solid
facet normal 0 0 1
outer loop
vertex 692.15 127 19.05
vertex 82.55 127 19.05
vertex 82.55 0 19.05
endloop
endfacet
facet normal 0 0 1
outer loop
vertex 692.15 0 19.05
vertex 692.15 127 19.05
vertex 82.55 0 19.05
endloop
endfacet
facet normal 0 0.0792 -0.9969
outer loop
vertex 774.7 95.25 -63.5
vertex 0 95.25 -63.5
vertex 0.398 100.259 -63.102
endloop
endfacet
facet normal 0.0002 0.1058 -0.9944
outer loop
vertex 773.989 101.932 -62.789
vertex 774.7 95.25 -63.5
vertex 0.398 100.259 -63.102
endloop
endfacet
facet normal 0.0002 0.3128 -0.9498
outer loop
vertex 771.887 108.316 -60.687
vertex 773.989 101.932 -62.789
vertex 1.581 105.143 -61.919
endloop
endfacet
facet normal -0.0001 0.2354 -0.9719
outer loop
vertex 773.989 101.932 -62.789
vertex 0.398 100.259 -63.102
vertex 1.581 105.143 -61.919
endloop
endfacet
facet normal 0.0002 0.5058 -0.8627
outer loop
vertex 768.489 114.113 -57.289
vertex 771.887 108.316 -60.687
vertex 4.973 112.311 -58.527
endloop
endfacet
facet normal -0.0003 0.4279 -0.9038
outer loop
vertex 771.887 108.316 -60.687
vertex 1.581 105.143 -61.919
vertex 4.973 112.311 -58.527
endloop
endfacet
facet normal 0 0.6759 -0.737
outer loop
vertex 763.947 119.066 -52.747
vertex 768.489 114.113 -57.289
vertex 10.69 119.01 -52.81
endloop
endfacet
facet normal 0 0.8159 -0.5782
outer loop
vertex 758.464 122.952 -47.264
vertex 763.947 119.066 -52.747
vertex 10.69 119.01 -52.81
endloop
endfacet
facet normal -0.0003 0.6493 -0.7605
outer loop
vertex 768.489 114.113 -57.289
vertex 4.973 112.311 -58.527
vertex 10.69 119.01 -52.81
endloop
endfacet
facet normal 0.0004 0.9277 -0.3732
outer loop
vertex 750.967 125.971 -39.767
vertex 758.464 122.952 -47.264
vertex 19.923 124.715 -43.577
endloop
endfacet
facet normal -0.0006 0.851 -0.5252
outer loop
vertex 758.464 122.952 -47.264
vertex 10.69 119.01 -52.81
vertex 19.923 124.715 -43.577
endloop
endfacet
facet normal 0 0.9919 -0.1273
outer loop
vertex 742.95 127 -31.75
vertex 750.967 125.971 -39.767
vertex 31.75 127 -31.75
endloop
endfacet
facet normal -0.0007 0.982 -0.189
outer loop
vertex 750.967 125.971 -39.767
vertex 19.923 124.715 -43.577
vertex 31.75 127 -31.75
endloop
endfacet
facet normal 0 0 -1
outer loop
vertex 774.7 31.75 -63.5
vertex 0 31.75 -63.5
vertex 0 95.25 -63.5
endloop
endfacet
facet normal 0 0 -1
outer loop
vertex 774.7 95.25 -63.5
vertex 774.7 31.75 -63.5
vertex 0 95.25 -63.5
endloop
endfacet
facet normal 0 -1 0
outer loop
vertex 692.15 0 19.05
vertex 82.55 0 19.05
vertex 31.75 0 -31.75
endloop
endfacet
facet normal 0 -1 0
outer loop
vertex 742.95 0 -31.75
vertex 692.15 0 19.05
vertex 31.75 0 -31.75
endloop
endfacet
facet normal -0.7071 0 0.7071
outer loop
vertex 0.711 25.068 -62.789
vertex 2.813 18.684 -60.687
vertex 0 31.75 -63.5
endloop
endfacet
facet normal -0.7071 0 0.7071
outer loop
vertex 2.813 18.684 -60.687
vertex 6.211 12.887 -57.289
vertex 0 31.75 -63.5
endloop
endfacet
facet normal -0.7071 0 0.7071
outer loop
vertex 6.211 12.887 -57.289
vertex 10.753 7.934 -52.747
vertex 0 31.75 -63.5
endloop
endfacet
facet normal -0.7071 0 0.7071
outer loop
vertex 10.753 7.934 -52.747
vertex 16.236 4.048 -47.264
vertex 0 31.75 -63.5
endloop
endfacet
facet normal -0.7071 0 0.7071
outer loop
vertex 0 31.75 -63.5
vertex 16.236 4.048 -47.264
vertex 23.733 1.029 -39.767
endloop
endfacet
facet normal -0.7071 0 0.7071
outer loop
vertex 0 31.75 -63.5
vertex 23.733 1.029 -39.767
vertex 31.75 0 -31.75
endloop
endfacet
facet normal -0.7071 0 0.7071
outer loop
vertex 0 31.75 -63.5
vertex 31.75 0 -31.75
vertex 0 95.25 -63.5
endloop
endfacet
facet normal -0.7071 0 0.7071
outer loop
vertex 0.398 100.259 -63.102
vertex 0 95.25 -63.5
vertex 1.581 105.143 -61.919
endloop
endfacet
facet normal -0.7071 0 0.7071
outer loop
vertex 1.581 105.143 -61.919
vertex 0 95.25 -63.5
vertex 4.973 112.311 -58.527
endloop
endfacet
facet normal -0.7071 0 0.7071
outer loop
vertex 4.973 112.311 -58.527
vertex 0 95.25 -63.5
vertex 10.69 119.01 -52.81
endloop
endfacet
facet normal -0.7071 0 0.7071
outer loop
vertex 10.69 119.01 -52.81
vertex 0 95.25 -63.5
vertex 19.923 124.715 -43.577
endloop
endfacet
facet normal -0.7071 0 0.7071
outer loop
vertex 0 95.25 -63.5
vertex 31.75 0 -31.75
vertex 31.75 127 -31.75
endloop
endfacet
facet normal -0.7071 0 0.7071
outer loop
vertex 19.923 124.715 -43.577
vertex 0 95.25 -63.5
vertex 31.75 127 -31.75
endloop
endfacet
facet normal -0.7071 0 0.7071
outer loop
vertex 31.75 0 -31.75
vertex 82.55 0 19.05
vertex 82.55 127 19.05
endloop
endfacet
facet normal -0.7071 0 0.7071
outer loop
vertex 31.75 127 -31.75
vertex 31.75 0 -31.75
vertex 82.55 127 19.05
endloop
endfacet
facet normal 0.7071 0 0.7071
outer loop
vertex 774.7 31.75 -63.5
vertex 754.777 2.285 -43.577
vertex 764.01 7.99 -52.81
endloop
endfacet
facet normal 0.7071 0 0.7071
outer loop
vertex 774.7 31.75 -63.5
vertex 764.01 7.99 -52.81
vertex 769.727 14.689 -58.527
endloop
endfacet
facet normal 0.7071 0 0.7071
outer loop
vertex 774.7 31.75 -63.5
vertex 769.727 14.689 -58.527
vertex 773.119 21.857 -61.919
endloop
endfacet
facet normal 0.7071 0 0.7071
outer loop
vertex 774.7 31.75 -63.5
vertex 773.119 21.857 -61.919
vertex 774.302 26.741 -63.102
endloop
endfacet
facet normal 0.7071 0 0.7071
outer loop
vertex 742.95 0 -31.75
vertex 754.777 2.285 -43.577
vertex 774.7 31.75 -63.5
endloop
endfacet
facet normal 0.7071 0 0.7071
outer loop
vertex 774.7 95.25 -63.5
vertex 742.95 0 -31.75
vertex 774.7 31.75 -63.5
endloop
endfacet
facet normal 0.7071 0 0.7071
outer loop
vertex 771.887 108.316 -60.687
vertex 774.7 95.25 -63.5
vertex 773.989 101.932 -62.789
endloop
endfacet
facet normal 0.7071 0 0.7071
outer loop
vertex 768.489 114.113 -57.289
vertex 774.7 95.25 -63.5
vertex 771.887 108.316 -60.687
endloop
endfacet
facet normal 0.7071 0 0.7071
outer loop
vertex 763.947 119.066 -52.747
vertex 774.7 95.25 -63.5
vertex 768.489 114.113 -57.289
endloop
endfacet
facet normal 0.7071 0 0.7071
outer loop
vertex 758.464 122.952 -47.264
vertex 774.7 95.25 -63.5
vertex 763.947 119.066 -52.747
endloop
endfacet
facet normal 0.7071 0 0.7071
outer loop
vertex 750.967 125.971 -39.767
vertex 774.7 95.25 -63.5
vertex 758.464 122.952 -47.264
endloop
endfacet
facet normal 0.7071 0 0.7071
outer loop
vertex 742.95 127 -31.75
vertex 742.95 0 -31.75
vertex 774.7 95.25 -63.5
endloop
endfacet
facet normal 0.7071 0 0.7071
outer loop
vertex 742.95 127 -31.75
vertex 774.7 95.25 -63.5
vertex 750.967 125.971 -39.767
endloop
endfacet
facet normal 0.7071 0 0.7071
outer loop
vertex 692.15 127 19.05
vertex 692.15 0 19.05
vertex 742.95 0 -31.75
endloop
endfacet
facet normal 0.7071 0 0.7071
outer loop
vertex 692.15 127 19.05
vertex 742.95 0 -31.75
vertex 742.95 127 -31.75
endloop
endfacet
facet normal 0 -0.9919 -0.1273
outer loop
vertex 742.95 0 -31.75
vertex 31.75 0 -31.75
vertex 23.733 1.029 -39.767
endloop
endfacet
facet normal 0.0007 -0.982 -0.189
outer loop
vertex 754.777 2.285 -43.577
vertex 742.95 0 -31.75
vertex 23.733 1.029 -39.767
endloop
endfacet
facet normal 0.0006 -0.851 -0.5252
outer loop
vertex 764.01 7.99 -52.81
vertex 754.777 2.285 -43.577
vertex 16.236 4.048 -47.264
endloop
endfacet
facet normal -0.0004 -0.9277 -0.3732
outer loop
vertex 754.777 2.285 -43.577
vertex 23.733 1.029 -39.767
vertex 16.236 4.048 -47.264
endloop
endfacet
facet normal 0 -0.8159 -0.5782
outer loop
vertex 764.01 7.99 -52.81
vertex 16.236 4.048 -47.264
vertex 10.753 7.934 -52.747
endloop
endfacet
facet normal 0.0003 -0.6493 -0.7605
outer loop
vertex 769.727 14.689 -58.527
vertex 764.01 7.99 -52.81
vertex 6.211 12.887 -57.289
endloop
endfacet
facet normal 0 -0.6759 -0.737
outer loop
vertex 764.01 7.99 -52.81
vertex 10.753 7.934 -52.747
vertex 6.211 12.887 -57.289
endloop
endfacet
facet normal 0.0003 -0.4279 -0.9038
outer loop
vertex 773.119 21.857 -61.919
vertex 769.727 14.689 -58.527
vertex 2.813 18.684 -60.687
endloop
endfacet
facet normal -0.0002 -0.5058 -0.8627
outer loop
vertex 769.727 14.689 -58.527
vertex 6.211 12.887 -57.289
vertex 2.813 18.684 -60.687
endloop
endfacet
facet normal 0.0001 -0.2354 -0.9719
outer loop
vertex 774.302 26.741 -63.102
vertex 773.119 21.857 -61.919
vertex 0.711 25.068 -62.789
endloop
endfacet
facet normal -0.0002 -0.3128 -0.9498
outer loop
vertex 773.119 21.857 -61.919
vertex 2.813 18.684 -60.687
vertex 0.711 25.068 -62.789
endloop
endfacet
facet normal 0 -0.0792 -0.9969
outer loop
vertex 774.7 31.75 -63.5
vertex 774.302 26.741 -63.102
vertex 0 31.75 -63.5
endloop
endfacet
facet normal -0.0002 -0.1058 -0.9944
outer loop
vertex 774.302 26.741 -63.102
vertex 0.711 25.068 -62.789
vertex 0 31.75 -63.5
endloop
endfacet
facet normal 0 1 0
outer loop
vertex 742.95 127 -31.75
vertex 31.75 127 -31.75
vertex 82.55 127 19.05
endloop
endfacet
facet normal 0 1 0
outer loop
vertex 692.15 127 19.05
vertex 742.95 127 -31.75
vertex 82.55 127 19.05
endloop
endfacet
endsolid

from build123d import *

# Parameters (mm, degrees)
BOSS_EXTRUDE1_DEPTH = 774.7
SKETCH2_W           = 344.402501539
SKETCH2_H           = 780.457540957
CUT_EXTRUDE1_DEPTH  = 59.371664787


with BuildPart() as part:
    # Sketch1 → Boss-Extrude1 (new body)
    with BuildSketch(Plane(origin=(0, 0, 0), x_dir=(0, 0, -1), z_dir=(1, 0, 0))):
        with BuildLine():
            Line((0, 0), (31.75, 0))
            ThreePointArc((31.75, 0), (54.200640303, 9.299359697), (63.5, 31.75))
            Line((63.5, 31.75), (63.5, 95.25))
            ThreePointArc((63.5, 95.25), (54.200640303, 117.700640303), (31.75, 127))
            Line((31.75, 127), (0, 127))
            Line((0, 127), (-19.05, 127))
            Line((-19.05, 127), (-19.05, 0))
            Line((-19.05, 0), (0, 0))
        make_face()
    extrude(amount=BOSS_EXTRUDE1_DEPTH)

    # Sketch2 → Cut-Extrude1 (cut, through all)
    with BuildSketch(Plane(origin=(355.6, 0, 355.6), x_dir=(0, 1, 0), z_dir=(0.707106781, 0, 0.707106781))):
        with Locations((32.995160032, -592.696903991)):
            Rectangle(SKETCH2_W, SKETCH2_H)
    cut_extrude1 = extrude(amount=CUT_EXTRUDE1_DEPTH, mode=Mode.SUBTRACT)

    # Mirror1: Cut-Extrude1 across plane
    add(cut_extrude1.mirror(Plane(origin=(387.35, 0, 0), x_dir=(0, 0, 1), z_dir=(1, 0, 0))), mode=Mode.SUBTRACT)


solid = part.part
